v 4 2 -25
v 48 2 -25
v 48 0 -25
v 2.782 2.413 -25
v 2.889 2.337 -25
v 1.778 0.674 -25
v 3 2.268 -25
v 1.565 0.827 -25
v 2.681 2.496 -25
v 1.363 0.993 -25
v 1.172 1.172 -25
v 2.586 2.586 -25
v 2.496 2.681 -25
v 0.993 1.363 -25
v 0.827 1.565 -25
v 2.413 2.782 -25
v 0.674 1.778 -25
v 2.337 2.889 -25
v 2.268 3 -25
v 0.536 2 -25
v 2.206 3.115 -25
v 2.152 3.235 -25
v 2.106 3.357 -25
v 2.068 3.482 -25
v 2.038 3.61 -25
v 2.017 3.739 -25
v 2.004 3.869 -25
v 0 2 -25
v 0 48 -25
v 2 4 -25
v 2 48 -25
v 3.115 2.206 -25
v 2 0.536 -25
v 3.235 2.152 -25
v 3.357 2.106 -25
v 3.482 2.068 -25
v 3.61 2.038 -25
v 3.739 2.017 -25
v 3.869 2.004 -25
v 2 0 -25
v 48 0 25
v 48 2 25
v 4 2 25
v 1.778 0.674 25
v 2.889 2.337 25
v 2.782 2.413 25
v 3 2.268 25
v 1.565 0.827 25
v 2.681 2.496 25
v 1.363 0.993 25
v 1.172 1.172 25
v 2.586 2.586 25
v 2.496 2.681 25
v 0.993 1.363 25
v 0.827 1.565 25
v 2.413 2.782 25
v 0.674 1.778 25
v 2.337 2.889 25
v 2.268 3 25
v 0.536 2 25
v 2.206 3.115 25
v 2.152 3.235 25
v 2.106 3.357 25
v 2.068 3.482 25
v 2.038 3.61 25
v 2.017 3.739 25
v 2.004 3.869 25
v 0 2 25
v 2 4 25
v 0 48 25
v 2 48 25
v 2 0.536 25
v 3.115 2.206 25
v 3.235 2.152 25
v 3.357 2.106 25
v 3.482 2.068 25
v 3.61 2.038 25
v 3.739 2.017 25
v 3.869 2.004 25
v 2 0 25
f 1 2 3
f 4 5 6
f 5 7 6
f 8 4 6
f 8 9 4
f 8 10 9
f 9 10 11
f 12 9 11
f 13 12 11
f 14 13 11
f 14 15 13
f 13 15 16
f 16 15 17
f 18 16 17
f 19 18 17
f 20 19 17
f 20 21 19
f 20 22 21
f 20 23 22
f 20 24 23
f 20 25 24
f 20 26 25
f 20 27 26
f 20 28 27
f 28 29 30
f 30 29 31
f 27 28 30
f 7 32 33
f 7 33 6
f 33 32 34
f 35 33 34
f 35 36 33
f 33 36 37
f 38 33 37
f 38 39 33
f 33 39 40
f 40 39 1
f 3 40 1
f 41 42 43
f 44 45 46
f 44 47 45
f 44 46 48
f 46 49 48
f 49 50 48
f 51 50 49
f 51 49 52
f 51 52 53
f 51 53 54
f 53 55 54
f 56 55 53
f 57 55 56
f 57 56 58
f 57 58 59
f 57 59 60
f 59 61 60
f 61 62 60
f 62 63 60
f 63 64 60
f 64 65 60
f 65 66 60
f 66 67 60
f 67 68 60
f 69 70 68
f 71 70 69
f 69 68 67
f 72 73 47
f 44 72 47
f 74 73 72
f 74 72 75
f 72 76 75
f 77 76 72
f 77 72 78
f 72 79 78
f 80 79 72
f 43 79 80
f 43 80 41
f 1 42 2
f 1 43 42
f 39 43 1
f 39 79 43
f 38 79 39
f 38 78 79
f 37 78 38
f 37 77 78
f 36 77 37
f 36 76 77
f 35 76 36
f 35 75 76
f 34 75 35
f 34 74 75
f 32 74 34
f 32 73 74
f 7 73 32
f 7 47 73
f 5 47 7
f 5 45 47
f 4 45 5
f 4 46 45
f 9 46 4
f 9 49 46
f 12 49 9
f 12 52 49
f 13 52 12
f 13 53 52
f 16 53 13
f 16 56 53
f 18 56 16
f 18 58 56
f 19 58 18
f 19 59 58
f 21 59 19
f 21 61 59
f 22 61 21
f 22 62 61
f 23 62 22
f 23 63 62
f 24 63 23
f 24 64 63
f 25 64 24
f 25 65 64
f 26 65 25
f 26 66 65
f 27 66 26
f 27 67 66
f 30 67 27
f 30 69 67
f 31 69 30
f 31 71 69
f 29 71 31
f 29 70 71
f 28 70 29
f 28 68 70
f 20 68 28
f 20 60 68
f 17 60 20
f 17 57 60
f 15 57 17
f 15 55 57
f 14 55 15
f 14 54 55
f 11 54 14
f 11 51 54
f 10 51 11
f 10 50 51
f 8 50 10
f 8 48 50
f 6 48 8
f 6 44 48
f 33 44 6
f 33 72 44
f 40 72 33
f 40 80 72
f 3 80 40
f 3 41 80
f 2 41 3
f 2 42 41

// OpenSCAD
// Units: mm

thickness_mm = 2.0;
bend_radius_mm = 2.0;
k_factor = 0.45;
bend_angle_deg = 90;
bend_angle_rad = bend_angle_deg * PI / 180;

flange_a_outside_mm = 50;
flange_b_outside_mm = 50;
width_mm = 50;

outside_setback_mm = (bend_radius_mm + thickness_mm) * tan(bend_angle_deg / 2);
bend_allowance_mm = bend_angle_rad * (bend_radius_mm + k_factor * thickness_mm);
bend_deduction_mm = 2 * outside_setback_mm - bend_allowance_mm;
developed_flat_length_mm = flange_a_outside_mm + flange_b_outside_mm - bend_deduction_mm;

straight_a_mm = flange_a_outside_mm - outside_setback_mm;
straight_b_mm = flange_b_outside_mm - outside_setback_mm;

echo(str(
    "MAKERBENCH-SHEETMETAL: {",
    "\"thickness_mm\":", thickness_mm, ",",
    "\"bend_radius_mm\":", bend_radius_mm, ",",
    "\"developed_flat_length_mm\":", developed_flat_length_mm,
    "}"
));

$fn = 96;

module annular_bend_2d(r_inner, t) {
    difference() {
        intersection() {
            circle(r = r_inner + t);
            square([r_inner + t, r_inner + t], center = false);
        }
        circle(r = r_inner);
    }
}

module formed_l_bracket_2d() {
    union() {
        translate([bend_radius_mm, 0])
            square([straight_a_mm, thickness_mm], center = false);

        translate([0, bend_radius_mm])
            square([thickness_mm, straight_b_mm], center = false);

        translate([bend_radius_mm + thickness_mm, bend_radius_mm + thickness_mm])
            rotate([0, 0, 180])
                annular_bend_2d(bend_radius_mm, thickness_mm);
    }
}

linear_extrude(height = width_mm, center = true, convexity = 10)
    formed_l_bracket_2d();
